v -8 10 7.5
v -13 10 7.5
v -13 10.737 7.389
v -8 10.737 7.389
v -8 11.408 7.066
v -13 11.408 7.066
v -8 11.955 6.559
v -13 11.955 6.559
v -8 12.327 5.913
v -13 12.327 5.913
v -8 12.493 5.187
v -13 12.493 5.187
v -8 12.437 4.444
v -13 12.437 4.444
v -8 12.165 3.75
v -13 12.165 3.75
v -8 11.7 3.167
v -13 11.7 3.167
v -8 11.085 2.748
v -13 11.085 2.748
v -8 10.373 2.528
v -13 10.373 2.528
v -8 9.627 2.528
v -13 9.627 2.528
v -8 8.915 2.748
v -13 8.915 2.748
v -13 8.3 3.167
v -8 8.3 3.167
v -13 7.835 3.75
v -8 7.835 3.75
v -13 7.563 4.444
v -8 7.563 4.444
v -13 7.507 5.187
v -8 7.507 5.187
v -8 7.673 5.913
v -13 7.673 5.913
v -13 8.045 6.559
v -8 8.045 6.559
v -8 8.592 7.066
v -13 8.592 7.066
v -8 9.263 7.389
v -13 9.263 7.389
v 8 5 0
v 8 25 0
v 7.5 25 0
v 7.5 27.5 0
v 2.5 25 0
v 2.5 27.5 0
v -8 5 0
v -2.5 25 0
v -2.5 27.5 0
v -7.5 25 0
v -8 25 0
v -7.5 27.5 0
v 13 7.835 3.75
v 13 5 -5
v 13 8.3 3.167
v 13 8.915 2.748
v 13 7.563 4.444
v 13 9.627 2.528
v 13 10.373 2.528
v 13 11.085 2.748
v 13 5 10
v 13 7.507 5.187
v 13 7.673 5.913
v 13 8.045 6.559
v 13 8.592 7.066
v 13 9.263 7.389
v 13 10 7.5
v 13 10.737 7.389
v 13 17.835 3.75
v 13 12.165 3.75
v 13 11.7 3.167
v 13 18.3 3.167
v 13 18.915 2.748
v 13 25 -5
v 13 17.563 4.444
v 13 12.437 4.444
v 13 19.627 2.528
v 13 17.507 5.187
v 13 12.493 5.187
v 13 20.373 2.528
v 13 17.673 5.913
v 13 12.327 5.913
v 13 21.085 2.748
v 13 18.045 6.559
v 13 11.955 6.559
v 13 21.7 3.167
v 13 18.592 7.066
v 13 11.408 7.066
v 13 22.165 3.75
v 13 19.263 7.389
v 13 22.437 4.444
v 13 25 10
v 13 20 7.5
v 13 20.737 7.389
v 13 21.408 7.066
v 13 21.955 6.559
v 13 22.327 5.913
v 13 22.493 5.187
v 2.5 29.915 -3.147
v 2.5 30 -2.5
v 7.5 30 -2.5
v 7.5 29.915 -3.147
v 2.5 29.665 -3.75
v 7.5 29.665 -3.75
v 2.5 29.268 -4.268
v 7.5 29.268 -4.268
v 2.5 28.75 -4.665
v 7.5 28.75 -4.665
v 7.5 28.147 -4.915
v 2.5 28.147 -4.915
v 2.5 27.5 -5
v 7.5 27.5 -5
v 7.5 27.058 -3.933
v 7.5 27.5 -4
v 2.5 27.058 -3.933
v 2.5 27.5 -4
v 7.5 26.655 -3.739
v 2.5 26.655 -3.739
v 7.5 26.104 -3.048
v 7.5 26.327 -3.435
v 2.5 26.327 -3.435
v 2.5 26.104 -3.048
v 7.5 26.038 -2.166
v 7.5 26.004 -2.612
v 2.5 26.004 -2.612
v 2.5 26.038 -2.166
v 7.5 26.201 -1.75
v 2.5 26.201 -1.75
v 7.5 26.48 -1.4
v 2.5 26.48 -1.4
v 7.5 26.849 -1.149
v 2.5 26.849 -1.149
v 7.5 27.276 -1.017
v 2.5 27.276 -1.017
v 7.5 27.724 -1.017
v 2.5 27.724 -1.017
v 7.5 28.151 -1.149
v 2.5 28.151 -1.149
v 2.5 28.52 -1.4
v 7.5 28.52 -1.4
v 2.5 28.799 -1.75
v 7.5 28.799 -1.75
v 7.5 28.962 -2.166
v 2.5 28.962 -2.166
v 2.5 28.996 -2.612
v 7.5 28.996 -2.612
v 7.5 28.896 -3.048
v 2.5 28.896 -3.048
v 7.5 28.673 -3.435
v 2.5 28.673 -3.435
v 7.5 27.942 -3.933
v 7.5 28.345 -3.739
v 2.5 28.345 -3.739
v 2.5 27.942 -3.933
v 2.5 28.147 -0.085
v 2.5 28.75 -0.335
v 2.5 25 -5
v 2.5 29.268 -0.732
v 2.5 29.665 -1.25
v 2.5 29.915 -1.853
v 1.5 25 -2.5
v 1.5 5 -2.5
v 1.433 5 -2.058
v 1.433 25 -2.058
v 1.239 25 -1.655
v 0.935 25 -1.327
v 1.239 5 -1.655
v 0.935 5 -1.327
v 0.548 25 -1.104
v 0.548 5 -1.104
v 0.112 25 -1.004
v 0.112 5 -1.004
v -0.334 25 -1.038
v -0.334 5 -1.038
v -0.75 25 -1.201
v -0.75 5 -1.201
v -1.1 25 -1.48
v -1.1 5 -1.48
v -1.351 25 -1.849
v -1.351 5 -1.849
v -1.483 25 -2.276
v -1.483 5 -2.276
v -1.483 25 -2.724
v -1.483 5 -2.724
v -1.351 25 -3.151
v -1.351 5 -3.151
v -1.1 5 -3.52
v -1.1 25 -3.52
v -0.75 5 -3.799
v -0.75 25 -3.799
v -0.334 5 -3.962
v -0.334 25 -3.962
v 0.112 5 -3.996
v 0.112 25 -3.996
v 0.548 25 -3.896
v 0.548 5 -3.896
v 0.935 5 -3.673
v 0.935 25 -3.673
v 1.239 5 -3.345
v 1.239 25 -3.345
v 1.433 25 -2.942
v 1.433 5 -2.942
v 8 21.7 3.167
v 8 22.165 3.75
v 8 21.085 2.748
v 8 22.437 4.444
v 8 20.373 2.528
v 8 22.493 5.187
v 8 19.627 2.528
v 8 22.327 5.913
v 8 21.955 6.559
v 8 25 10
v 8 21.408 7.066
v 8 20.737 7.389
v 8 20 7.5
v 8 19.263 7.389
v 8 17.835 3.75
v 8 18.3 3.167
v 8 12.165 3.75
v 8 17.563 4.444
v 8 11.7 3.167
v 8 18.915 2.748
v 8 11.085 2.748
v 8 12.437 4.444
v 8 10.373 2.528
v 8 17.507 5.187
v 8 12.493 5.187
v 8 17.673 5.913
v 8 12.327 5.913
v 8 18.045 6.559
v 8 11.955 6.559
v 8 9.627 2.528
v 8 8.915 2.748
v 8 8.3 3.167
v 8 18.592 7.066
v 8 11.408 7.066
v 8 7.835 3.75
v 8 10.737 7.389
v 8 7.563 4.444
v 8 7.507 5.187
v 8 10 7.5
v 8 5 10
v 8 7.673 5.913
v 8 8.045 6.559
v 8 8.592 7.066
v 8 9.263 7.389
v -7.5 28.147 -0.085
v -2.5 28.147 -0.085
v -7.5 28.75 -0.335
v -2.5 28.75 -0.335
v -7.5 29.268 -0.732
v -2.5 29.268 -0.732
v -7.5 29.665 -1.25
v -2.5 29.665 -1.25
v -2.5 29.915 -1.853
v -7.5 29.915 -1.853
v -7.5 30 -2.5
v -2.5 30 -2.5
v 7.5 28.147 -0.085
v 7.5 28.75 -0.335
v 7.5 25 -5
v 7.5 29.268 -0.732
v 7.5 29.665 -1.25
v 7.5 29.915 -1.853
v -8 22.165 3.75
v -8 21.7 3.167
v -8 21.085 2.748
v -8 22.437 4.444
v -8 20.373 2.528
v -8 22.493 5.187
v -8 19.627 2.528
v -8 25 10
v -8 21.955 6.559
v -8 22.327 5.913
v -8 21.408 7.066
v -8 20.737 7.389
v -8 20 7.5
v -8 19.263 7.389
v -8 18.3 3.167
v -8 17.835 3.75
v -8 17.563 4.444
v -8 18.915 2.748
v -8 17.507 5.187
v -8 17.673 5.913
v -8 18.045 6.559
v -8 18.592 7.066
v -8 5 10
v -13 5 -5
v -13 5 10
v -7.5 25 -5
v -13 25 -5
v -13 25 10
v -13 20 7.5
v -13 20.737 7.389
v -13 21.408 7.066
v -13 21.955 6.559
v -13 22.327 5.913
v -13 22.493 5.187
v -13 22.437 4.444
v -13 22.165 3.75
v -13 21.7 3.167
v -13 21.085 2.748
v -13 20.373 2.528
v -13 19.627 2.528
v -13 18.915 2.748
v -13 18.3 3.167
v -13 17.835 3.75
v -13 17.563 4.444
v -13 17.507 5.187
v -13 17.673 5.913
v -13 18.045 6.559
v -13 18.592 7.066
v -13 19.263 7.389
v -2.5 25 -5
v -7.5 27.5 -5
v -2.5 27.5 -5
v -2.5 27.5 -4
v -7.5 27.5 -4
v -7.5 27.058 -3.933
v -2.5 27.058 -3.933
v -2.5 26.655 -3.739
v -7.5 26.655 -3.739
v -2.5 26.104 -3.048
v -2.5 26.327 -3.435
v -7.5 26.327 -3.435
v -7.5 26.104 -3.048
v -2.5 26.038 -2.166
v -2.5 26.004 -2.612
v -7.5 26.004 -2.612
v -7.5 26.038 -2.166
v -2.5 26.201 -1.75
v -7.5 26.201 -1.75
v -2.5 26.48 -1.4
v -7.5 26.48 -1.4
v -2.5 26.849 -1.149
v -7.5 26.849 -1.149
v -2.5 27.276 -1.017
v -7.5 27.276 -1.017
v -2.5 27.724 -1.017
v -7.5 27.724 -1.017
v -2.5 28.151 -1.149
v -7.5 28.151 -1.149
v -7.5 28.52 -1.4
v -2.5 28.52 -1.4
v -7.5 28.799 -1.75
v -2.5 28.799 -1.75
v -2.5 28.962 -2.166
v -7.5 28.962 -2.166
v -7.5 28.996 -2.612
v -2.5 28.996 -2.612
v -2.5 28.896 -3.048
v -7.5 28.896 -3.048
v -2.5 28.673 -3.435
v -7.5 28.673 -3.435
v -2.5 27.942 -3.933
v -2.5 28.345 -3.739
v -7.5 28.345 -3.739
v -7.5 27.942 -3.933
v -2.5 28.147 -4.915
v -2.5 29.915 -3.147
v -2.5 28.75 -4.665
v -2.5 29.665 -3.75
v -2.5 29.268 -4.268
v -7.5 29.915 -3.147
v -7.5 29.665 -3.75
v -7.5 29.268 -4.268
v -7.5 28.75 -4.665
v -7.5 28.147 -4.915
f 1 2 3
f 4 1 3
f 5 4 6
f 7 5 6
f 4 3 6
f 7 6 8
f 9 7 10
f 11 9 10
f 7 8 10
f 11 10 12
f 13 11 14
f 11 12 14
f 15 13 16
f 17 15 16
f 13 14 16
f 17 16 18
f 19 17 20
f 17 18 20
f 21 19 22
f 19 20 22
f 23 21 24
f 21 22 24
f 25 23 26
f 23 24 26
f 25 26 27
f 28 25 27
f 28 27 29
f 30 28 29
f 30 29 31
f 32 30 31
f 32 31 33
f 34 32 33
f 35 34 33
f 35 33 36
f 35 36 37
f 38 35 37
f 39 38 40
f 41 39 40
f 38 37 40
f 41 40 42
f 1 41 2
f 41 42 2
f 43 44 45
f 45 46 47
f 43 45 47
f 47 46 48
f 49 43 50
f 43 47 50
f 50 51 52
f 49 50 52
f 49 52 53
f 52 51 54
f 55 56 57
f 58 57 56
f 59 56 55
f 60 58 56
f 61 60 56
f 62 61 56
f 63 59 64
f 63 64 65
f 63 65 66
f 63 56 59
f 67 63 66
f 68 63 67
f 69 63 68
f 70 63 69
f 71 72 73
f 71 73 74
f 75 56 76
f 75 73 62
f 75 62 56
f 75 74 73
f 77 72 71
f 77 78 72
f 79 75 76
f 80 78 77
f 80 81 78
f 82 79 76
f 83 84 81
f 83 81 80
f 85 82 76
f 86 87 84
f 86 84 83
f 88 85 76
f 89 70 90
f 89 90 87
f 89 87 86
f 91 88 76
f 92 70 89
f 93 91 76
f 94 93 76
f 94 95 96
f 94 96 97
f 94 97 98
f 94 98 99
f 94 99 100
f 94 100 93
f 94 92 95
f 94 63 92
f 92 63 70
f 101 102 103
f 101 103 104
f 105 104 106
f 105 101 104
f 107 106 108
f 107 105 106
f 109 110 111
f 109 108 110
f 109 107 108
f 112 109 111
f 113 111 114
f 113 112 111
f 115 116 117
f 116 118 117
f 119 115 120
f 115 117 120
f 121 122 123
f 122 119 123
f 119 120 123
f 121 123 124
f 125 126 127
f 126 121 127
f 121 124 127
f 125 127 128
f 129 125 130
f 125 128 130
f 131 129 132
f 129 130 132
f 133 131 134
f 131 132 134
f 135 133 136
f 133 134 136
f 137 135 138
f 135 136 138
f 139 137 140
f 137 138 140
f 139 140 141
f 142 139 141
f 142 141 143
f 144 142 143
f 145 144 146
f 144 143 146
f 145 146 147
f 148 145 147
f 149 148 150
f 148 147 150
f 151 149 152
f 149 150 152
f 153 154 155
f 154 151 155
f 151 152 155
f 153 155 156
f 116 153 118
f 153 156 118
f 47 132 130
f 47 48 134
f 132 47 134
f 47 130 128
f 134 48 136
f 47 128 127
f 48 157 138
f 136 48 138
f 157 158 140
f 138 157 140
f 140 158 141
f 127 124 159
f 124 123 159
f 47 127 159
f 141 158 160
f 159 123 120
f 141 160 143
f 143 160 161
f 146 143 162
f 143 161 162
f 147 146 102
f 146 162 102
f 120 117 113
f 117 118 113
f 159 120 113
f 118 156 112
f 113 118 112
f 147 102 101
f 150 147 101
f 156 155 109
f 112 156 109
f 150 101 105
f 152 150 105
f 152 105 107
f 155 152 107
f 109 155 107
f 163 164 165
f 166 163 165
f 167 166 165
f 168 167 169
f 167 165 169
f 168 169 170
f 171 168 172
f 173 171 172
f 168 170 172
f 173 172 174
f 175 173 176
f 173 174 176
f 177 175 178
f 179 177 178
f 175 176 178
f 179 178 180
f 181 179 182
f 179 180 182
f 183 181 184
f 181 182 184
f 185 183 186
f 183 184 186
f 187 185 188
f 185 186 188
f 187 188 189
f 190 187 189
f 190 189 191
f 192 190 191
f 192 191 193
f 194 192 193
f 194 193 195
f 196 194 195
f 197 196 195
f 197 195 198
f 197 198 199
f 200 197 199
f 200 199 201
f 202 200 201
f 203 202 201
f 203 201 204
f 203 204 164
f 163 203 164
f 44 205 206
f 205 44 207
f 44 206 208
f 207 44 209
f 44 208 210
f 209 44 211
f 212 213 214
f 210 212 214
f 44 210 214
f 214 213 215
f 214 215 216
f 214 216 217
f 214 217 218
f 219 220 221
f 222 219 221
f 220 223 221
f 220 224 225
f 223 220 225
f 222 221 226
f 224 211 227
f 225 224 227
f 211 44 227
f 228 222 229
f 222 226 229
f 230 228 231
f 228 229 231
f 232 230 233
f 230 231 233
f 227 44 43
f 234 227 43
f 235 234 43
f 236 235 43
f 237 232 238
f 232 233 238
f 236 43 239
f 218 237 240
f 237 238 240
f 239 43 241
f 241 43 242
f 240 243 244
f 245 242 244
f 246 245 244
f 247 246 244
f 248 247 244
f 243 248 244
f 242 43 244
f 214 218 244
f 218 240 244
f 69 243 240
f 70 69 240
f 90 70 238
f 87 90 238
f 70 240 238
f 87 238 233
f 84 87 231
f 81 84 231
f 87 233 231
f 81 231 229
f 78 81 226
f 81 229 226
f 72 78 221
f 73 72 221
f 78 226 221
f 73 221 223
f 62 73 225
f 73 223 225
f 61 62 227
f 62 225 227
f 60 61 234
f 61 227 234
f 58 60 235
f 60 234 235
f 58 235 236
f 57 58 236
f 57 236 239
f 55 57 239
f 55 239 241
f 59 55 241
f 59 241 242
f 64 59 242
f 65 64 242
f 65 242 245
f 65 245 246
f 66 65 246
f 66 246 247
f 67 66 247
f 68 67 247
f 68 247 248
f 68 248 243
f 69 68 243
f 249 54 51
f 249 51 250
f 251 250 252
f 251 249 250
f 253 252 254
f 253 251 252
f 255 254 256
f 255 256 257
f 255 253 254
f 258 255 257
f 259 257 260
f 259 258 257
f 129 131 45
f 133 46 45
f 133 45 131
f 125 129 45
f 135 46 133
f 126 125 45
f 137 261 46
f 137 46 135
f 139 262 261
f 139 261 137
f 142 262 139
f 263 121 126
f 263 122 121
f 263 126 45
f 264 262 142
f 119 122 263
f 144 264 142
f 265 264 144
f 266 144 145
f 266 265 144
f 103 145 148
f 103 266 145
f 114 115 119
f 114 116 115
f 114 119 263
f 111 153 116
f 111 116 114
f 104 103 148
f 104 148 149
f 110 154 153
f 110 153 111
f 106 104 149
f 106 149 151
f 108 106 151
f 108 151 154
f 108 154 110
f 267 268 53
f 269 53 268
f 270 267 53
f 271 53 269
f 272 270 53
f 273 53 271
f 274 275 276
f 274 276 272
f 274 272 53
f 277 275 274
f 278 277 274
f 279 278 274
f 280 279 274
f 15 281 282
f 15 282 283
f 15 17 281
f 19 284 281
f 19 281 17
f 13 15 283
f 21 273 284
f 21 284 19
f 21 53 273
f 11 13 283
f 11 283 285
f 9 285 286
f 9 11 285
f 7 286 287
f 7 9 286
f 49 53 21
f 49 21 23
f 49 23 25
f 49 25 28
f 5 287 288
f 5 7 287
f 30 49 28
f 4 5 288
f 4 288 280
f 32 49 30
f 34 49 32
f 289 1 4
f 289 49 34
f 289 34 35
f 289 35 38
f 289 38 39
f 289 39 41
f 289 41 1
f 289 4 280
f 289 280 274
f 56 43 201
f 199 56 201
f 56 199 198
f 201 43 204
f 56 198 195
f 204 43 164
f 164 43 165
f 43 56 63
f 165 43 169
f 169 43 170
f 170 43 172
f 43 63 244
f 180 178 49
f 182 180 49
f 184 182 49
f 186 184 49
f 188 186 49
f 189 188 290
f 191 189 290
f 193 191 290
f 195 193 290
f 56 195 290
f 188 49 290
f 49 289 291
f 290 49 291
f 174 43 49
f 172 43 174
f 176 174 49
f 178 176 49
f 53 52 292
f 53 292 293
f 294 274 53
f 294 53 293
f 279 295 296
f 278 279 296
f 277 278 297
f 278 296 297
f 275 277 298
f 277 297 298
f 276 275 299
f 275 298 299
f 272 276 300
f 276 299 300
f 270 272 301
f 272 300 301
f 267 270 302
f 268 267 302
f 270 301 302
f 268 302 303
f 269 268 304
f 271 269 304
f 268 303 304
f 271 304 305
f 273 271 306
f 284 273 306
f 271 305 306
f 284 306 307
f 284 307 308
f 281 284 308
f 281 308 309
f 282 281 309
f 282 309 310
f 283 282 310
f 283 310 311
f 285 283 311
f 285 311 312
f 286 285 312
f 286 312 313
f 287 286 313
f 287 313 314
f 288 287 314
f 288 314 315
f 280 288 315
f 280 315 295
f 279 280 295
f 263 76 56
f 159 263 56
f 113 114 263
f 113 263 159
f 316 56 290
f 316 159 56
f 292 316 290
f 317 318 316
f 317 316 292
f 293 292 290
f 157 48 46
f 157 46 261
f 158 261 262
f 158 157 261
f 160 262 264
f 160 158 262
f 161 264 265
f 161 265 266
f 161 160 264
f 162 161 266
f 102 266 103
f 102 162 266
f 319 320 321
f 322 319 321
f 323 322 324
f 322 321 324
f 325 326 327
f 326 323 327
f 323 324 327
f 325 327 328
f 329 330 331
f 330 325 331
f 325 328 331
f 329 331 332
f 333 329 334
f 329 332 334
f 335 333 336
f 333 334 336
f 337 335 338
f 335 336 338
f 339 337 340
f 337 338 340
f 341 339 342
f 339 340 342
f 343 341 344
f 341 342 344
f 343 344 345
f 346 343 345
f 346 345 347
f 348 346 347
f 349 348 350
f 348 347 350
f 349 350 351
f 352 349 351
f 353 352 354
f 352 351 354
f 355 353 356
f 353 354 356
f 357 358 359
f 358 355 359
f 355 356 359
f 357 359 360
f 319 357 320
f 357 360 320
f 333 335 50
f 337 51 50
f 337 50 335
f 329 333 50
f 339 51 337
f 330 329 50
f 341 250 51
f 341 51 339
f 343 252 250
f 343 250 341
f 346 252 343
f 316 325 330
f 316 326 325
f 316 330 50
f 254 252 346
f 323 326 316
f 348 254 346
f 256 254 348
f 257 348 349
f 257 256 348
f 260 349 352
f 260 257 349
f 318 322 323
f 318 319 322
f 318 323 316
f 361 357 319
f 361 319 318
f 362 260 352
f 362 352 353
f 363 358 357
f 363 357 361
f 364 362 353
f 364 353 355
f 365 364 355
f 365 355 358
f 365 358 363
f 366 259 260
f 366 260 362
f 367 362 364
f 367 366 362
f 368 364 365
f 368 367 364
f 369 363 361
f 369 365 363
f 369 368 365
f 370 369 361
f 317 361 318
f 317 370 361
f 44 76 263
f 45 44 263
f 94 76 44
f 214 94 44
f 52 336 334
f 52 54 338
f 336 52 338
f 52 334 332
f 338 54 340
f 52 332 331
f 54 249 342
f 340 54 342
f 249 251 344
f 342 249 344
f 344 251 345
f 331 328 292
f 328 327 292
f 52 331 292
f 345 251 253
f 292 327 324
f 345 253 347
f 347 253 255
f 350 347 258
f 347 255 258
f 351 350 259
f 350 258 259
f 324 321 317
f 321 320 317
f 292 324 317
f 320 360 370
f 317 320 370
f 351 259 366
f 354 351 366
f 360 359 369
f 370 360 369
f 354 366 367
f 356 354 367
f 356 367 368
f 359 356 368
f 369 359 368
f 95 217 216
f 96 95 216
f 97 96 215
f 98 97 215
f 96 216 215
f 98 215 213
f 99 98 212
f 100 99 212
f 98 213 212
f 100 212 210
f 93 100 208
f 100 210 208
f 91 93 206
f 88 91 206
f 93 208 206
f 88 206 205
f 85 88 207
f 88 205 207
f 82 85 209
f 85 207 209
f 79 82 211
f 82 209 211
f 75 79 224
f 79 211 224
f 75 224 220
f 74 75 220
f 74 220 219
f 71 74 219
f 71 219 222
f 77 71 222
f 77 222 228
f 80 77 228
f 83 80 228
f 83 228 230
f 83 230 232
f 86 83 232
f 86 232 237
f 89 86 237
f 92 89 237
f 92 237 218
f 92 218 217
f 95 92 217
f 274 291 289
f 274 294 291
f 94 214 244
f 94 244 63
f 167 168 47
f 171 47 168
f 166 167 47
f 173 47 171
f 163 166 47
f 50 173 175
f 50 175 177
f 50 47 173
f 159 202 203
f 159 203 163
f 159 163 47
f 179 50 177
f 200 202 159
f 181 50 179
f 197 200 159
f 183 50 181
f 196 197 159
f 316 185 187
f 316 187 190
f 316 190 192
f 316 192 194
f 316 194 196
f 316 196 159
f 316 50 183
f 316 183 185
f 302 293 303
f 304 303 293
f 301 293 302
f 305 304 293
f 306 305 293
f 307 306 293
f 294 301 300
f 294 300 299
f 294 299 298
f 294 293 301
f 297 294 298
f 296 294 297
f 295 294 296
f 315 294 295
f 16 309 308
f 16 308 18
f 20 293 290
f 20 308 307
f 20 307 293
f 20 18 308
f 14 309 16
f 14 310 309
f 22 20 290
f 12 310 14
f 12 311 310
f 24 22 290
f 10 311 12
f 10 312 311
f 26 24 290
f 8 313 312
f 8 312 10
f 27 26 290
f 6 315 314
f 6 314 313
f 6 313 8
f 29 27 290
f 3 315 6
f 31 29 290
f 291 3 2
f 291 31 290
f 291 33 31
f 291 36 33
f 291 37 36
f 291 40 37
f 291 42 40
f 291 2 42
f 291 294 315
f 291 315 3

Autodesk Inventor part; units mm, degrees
ref_plane "YZ Plane" through (0, 0, 0) normal (1, 0, 0) x (0, 1, 0)
sketch "스케치1" plane through (0, 0, 0) normal (0, 0, 1) x (1, 0, 0)
  line L0 (-13, -5) -> (13, -5)
  line L1 (13, -5) -> (13, 5)
  line L2 (13, 5) -> (-13, 5)
  line L3 (-13, 5) -> (-13, -5)
  line L4 (-13, -5) -> (13, 5) construction
  line L5 (13, -5) -> (-13, 5) construction
  circle A0 centre (0, 0) radius 2.5
  dimension "d0" = 26
  dimension "d1" = 10
  dimension "d2" = 5
extrude "돌출1" add sketch "스케치1" along normal blind 10
sketch "스케치2" plane through (-13, 5, 0) normal (0, 1, 0) x (1, 0, 0)
  line L0 (26, 0) -> (0, 0) projected
  line L1 (26, -10) -> (0, -10) projected
  line L2 (0, 0) -> (5, 0)
  line L3 (5, 0) -> (5, -10)
  line L4 (5, -10) -> (0, -10)
  line L5 (0, -10) -> (0, 0)
  line L6 (13, 0) -> (13, -10)
  line L7 (26, 0) -> (21, 0)
  line L8 (21, 0) -> (21, -10)
  line L9 (21, -10) -> (26, -10)
  line L10 (26, -10) -> (26, 0)
  point P0 (0, -10)
  point P1 (21, 0)
  dimension "d5" = 5
  dimension "d6" = 8
extrude "돌출2" add sketch "스케치2" along normal blind 10 contours L10 L1 L8 L0 | L3 L1 L5 L0
sketch "스케치3" plane through (-13, 5, 0) normal (-1, 0, 0) x (0, 0, 1)
  circle A0 centre (5, 5) radius 2.5
  line L0 (0, 10) -> (10, 10) projected
  line L1 (10, -10) -> (10, 10) projected
  point P0 (0, -5)
  point P1 (10, 0)
  point P2 (10, 5)
  point P3 (5, 10)
  point P4 (5, 10)
  dimension "d9" = 5
extrude "돌출3" cut sketch "스케치3" against normal through all
ref_plane "작업 평면1" through (-13, 15, 0) normal (0, 1, 0) x (1, 0, 0)
mirror "미러1" about plane through (-10.5, 15, 5) normal (0, 1, 0) of "돌출3", "돌출2"
sketch "스케치4" plane through (0, 0, 0) normal (0, 0, -1) x (-1, 0, 0)
  line L0 (-13, 5) -> (-13, 25) projected
  line L1 (13, -5) -> (-13, -5) projected
  line L2 (-13, 25) -> (13, 25)
  line L3 (13, 25) -> (13, -5)
  line L4 (13, -5) -> (-13, -5)
  line L5 (-13, -5) -> (-13, 25)
  point P0 (0, 0)
  point P1 (13, 25)
extrude "돌출4" add sketch "스케치4" along normal blind 5
ref_plane "작업 평면2" through (0, -5, 10) normal (1, 0, 0) x (0, 0, -1)
sketch "스케치5" plane through (0, -5, 10) normal (1, 0, 0) x (0, 0, -1)
  line L0 (10, 10) -> (10, 30) projected
  line L1 (10, 30) -> (15, 30)
  line L2 (15, 30) -> (15, 35)
  line L3 (15, 35) -> (10, 35)
  line L4 (10, 35) -> (10, 30)
  circle A0 centre (12.5, 32.5) radius 1.5
  point P0 (10, 5)
  point P1 (10, 32.5)
  point P2 (12.5, 35)
  dimension "d16" = 5
  dimension "d19" = 3
extrude "돌출5" add sketch "스케치5" along normal mid plane 15
extrude "돌출6" cut sketch "스케치5" along normal mid plane 5
fillet "모깎기2" radius 2.5 4 edges at (-5, 30, -5) (-5, 30, 0) (5, 30, -5) (5, 30, 0)
sketch "스케치6" plane through (0, 0, 10) normal (0, 0, 1) x (1, 0, 0)
  line L0 (-13, -5) -> (13, -5) projected
  line L1 (13, 25) -> (13, -5) projected
  line L2 (-13, -5) -> (13, -5)
  line L3 (13, -5) -> (13, 5)
  line L4 (13, 5) -> (-13, 5)
  line L5 (-13, 5) -> (-13, -5)
  point P0 (0, 0)
  point P1 (8, 5)
extrude "돌출7" cut sketch "스케치6" against normal through all
sketch "스케치7" plane through (-8, 5, 0) normal (0, -1, 0) x (1, 0, 0)
  circle A0 centre (8, -2.5) radius 1.5
  line L0 (16, 0) -> (0, 0) projected
  line L1 (21, -5) -> (-5, -5) projected
  point P0 (8, 0)
  point P1 (8, 0)
  dimension "d25" = 3
  dimension "d26" = 5
  dimension "d27" = 2.5
extrude "돌출8" cut sketch "스케치7" against normal through all
equation "\"d27\" = 0.5 * d26"
properties part number "SteeringFrameFront"
